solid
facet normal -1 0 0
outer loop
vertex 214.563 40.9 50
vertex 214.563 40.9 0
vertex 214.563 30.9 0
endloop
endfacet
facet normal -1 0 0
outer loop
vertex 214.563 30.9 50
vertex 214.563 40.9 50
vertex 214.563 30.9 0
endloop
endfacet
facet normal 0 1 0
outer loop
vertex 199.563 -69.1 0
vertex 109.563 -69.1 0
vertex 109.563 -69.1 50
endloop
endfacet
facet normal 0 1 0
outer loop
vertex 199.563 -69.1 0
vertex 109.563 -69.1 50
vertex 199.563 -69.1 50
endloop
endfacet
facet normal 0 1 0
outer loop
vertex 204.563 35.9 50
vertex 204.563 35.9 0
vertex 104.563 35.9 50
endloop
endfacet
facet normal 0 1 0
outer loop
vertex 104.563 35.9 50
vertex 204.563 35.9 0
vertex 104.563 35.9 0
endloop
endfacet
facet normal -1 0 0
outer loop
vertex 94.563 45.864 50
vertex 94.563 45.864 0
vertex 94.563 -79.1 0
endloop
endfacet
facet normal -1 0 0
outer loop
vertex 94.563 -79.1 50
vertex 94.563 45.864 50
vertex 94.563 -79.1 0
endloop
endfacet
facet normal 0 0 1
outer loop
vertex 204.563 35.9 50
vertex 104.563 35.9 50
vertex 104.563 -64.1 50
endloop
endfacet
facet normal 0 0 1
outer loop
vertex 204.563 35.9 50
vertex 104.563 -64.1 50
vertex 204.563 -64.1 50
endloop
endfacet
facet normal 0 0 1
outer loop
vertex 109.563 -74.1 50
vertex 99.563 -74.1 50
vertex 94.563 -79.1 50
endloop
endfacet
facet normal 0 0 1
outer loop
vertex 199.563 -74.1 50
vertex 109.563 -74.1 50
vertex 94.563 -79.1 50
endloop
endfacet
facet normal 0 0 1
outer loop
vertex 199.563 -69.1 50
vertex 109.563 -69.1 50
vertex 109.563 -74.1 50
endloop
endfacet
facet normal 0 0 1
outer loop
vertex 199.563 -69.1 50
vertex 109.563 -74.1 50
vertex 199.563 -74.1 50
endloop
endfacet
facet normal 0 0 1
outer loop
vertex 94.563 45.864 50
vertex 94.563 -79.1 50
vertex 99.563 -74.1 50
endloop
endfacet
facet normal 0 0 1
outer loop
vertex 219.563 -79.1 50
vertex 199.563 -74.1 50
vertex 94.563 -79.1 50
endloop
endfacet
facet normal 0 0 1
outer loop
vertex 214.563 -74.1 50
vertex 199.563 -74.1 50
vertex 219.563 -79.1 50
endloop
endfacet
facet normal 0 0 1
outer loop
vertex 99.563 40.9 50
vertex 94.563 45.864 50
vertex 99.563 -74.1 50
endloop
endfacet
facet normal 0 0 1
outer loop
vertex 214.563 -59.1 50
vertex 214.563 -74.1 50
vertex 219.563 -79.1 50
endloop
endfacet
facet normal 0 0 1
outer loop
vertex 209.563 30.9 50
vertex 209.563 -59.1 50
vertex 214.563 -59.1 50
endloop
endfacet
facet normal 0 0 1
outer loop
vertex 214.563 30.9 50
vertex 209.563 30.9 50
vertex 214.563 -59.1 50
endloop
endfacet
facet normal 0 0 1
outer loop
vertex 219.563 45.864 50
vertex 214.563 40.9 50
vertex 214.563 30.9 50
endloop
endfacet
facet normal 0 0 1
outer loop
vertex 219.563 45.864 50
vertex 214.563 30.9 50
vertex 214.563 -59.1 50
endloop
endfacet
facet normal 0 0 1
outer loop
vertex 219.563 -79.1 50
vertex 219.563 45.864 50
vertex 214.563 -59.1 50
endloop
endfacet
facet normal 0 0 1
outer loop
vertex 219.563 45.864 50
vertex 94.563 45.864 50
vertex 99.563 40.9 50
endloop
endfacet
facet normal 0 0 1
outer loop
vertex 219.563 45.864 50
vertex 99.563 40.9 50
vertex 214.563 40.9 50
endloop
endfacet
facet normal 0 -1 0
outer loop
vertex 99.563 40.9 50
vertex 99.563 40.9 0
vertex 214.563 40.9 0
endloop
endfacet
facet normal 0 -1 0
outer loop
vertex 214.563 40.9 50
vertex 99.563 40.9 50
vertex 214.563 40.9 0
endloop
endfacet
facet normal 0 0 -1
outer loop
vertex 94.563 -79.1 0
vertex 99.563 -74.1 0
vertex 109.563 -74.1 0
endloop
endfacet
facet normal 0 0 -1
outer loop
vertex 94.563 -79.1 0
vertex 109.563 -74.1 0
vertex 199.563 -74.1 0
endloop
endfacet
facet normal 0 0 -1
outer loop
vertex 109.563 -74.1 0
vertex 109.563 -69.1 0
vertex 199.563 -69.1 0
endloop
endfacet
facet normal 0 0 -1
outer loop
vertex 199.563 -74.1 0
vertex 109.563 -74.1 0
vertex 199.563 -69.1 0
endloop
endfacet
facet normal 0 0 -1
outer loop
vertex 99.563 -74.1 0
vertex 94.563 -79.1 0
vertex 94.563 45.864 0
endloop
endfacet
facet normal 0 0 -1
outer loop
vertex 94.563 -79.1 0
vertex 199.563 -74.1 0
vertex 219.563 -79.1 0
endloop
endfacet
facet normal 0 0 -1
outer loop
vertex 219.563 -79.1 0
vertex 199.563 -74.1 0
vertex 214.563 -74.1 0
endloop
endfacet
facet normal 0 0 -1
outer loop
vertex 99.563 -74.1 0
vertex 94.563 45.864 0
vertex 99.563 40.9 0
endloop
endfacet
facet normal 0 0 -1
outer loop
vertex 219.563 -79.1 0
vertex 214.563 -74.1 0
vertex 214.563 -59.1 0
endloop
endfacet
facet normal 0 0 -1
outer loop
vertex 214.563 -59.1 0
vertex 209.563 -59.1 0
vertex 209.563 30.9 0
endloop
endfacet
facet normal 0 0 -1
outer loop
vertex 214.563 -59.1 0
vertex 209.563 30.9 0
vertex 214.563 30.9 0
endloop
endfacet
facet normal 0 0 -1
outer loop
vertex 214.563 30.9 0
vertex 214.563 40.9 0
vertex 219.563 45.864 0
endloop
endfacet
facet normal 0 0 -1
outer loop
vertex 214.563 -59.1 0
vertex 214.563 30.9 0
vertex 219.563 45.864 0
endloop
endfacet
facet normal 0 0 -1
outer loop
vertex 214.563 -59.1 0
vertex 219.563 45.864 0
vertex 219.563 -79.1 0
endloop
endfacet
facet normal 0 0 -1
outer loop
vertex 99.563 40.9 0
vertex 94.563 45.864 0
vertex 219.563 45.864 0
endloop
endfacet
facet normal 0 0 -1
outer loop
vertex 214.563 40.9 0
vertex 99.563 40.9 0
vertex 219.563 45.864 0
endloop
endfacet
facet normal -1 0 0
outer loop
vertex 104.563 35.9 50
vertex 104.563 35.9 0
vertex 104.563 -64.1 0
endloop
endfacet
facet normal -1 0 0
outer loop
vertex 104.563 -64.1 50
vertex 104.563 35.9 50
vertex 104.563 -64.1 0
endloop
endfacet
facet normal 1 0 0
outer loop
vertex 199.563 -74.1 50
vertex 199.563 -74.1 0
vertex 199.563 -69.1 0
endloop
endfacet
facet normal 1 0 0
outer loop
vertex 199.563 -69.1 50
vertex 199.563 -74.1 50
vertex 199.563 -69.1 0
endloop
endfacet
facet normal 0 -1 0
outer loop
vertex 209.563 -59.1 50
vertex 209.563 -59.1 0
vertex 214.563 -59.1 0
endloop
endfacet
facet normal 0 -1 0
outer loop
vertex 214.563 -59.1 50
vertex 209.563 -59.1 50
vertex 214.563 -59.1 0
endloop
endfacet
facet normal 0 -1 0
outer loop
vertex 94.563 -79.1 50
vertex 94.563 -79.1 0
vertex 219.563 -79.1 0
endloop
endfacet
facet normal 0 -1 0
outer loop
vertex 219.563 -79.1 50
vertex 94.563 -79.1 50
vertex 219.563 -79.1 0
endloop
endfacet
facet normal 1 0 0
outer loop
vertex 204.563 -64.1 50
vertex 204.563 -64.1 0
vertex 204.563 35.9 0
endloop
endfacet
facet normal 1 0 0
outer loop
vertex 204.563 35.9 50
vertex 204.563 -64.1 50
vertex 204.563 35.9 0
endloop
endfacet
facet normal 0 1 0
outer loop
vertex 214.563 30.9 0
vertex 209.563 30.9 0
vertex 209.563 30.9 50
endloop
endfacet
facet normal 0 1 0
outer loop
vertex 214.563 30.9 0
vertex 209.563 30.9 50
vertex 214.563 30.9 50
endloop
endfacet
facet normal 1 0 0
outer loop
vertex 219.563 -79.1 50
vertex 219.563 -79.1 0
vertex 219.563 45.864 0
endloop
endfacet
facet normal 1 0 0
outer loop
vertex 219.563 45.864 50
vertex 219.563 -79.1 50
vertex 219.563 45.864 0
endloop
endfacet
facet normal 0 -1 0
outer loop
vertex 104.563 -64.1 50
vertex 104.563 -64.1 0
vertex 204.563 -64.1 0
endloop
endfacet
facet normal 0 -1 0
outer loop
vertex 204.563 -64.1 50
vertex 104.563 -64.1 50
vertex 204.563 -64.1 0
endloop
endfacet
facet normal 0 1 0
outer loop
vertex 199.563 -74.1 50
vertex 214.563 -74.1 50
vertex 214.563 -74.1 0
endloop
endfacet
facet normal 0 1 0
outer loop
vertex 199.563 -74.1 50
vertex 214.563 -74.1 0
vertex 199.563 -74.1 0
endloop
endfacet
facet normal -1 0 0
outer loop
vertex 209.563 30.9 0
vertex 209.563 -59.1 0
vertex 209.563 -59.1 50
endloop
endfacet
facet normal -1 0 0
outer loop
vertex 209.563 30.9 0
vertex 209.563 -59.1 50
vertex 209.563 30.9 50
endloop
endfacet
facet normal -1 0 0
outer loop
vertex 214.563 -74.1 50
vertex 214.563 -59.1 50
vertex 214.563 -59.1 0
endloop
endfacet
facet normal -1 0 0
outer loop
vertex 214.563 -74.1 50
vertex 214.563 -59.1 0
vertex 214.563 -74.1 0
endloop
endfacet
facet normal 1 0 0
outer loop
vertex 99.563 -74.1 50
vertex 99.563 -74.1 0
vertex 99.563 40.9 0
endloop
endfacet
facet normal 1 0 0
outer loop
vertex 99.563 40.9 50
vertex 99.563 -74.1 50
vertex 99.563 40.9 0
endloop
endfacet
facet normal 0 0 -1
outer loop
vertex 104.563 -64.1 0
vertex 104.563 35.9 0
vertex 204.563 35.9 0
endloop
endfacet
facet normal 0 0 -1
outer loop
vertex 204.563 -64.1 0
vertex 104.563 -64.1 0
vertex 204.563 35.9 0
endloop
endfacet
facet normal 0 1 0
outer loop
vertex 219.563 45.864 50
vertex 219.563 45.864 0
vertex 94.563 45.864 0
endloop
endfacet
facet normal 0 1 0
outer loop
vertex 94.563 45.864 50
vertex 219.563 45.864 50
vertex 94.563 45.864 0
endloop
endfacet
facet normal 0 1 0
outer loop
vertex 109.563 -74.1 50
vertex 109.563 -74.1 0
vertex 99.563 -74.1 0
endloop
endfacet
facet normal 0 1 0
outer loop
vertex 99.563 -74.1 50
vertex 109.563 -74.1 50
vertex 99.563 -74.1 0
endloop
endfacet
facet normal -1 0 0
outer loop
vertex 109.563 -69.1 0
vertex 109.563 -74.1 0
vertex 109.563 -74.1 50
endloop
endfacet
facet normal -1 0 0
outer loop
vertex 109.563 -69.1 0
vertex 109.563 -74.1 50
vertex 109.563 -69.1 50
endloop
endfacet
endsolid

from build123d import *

# Parameters (mm, degrees)
F2_DEPTH = 50
F1_W     = 90
F1_H     = 5
F1_W_2   = 5
F1_H_2   = 90
F3_DEPTH = 50


with BuildPart() as f2:
    # F0 (on Top) → F2 (new body)
    with BuildSketch(Plane.XY):
        Polygon((204.563049, -64.100122), (104.563049, 35.899878), (104.563049, -64.100122), align=None)
        Polygon((204.563049, 35.899878), (104.563049, 35.899878), (204.563049, -64.100122), align=None)
    extrude(amount=F2_DEPTH)


with BuildPart() as f3:
    # F1 (on Top) → F3 (new body)
    with BuildSketch(Plane.XY):
        Polygon((94.563049, -79.100122), (99.563049, -79.100122), (219.563049, -79.100122), (219.563049, 40.899878), (219.563049, 45.863766), (99.563049, 45.863766), (94.563049, 45.863766), (94.563049, 40.899878), align=None)
        Polygon((99.563049, -74.100122), (99.563049, 40.899878), (214.563049, 40.899878), (214.563049, 30.899878), (214.563049, -59.100122), (214.563049, -74.100122), (199.563049, -74.100122), (109.563049, -74.100122), align=None, mode=Mode.SUBTRACT)
        with Locations((154.563049, -71.600122)):
            Rectangle(F1_W, F1_H)
        with Locations((212.063049, -14.100122)):
            Rectangle(F1_W_2, F1_H_2)
    extrude(amount=F3_DEPTH)


solid = Compound([f2.part, f3.part])
